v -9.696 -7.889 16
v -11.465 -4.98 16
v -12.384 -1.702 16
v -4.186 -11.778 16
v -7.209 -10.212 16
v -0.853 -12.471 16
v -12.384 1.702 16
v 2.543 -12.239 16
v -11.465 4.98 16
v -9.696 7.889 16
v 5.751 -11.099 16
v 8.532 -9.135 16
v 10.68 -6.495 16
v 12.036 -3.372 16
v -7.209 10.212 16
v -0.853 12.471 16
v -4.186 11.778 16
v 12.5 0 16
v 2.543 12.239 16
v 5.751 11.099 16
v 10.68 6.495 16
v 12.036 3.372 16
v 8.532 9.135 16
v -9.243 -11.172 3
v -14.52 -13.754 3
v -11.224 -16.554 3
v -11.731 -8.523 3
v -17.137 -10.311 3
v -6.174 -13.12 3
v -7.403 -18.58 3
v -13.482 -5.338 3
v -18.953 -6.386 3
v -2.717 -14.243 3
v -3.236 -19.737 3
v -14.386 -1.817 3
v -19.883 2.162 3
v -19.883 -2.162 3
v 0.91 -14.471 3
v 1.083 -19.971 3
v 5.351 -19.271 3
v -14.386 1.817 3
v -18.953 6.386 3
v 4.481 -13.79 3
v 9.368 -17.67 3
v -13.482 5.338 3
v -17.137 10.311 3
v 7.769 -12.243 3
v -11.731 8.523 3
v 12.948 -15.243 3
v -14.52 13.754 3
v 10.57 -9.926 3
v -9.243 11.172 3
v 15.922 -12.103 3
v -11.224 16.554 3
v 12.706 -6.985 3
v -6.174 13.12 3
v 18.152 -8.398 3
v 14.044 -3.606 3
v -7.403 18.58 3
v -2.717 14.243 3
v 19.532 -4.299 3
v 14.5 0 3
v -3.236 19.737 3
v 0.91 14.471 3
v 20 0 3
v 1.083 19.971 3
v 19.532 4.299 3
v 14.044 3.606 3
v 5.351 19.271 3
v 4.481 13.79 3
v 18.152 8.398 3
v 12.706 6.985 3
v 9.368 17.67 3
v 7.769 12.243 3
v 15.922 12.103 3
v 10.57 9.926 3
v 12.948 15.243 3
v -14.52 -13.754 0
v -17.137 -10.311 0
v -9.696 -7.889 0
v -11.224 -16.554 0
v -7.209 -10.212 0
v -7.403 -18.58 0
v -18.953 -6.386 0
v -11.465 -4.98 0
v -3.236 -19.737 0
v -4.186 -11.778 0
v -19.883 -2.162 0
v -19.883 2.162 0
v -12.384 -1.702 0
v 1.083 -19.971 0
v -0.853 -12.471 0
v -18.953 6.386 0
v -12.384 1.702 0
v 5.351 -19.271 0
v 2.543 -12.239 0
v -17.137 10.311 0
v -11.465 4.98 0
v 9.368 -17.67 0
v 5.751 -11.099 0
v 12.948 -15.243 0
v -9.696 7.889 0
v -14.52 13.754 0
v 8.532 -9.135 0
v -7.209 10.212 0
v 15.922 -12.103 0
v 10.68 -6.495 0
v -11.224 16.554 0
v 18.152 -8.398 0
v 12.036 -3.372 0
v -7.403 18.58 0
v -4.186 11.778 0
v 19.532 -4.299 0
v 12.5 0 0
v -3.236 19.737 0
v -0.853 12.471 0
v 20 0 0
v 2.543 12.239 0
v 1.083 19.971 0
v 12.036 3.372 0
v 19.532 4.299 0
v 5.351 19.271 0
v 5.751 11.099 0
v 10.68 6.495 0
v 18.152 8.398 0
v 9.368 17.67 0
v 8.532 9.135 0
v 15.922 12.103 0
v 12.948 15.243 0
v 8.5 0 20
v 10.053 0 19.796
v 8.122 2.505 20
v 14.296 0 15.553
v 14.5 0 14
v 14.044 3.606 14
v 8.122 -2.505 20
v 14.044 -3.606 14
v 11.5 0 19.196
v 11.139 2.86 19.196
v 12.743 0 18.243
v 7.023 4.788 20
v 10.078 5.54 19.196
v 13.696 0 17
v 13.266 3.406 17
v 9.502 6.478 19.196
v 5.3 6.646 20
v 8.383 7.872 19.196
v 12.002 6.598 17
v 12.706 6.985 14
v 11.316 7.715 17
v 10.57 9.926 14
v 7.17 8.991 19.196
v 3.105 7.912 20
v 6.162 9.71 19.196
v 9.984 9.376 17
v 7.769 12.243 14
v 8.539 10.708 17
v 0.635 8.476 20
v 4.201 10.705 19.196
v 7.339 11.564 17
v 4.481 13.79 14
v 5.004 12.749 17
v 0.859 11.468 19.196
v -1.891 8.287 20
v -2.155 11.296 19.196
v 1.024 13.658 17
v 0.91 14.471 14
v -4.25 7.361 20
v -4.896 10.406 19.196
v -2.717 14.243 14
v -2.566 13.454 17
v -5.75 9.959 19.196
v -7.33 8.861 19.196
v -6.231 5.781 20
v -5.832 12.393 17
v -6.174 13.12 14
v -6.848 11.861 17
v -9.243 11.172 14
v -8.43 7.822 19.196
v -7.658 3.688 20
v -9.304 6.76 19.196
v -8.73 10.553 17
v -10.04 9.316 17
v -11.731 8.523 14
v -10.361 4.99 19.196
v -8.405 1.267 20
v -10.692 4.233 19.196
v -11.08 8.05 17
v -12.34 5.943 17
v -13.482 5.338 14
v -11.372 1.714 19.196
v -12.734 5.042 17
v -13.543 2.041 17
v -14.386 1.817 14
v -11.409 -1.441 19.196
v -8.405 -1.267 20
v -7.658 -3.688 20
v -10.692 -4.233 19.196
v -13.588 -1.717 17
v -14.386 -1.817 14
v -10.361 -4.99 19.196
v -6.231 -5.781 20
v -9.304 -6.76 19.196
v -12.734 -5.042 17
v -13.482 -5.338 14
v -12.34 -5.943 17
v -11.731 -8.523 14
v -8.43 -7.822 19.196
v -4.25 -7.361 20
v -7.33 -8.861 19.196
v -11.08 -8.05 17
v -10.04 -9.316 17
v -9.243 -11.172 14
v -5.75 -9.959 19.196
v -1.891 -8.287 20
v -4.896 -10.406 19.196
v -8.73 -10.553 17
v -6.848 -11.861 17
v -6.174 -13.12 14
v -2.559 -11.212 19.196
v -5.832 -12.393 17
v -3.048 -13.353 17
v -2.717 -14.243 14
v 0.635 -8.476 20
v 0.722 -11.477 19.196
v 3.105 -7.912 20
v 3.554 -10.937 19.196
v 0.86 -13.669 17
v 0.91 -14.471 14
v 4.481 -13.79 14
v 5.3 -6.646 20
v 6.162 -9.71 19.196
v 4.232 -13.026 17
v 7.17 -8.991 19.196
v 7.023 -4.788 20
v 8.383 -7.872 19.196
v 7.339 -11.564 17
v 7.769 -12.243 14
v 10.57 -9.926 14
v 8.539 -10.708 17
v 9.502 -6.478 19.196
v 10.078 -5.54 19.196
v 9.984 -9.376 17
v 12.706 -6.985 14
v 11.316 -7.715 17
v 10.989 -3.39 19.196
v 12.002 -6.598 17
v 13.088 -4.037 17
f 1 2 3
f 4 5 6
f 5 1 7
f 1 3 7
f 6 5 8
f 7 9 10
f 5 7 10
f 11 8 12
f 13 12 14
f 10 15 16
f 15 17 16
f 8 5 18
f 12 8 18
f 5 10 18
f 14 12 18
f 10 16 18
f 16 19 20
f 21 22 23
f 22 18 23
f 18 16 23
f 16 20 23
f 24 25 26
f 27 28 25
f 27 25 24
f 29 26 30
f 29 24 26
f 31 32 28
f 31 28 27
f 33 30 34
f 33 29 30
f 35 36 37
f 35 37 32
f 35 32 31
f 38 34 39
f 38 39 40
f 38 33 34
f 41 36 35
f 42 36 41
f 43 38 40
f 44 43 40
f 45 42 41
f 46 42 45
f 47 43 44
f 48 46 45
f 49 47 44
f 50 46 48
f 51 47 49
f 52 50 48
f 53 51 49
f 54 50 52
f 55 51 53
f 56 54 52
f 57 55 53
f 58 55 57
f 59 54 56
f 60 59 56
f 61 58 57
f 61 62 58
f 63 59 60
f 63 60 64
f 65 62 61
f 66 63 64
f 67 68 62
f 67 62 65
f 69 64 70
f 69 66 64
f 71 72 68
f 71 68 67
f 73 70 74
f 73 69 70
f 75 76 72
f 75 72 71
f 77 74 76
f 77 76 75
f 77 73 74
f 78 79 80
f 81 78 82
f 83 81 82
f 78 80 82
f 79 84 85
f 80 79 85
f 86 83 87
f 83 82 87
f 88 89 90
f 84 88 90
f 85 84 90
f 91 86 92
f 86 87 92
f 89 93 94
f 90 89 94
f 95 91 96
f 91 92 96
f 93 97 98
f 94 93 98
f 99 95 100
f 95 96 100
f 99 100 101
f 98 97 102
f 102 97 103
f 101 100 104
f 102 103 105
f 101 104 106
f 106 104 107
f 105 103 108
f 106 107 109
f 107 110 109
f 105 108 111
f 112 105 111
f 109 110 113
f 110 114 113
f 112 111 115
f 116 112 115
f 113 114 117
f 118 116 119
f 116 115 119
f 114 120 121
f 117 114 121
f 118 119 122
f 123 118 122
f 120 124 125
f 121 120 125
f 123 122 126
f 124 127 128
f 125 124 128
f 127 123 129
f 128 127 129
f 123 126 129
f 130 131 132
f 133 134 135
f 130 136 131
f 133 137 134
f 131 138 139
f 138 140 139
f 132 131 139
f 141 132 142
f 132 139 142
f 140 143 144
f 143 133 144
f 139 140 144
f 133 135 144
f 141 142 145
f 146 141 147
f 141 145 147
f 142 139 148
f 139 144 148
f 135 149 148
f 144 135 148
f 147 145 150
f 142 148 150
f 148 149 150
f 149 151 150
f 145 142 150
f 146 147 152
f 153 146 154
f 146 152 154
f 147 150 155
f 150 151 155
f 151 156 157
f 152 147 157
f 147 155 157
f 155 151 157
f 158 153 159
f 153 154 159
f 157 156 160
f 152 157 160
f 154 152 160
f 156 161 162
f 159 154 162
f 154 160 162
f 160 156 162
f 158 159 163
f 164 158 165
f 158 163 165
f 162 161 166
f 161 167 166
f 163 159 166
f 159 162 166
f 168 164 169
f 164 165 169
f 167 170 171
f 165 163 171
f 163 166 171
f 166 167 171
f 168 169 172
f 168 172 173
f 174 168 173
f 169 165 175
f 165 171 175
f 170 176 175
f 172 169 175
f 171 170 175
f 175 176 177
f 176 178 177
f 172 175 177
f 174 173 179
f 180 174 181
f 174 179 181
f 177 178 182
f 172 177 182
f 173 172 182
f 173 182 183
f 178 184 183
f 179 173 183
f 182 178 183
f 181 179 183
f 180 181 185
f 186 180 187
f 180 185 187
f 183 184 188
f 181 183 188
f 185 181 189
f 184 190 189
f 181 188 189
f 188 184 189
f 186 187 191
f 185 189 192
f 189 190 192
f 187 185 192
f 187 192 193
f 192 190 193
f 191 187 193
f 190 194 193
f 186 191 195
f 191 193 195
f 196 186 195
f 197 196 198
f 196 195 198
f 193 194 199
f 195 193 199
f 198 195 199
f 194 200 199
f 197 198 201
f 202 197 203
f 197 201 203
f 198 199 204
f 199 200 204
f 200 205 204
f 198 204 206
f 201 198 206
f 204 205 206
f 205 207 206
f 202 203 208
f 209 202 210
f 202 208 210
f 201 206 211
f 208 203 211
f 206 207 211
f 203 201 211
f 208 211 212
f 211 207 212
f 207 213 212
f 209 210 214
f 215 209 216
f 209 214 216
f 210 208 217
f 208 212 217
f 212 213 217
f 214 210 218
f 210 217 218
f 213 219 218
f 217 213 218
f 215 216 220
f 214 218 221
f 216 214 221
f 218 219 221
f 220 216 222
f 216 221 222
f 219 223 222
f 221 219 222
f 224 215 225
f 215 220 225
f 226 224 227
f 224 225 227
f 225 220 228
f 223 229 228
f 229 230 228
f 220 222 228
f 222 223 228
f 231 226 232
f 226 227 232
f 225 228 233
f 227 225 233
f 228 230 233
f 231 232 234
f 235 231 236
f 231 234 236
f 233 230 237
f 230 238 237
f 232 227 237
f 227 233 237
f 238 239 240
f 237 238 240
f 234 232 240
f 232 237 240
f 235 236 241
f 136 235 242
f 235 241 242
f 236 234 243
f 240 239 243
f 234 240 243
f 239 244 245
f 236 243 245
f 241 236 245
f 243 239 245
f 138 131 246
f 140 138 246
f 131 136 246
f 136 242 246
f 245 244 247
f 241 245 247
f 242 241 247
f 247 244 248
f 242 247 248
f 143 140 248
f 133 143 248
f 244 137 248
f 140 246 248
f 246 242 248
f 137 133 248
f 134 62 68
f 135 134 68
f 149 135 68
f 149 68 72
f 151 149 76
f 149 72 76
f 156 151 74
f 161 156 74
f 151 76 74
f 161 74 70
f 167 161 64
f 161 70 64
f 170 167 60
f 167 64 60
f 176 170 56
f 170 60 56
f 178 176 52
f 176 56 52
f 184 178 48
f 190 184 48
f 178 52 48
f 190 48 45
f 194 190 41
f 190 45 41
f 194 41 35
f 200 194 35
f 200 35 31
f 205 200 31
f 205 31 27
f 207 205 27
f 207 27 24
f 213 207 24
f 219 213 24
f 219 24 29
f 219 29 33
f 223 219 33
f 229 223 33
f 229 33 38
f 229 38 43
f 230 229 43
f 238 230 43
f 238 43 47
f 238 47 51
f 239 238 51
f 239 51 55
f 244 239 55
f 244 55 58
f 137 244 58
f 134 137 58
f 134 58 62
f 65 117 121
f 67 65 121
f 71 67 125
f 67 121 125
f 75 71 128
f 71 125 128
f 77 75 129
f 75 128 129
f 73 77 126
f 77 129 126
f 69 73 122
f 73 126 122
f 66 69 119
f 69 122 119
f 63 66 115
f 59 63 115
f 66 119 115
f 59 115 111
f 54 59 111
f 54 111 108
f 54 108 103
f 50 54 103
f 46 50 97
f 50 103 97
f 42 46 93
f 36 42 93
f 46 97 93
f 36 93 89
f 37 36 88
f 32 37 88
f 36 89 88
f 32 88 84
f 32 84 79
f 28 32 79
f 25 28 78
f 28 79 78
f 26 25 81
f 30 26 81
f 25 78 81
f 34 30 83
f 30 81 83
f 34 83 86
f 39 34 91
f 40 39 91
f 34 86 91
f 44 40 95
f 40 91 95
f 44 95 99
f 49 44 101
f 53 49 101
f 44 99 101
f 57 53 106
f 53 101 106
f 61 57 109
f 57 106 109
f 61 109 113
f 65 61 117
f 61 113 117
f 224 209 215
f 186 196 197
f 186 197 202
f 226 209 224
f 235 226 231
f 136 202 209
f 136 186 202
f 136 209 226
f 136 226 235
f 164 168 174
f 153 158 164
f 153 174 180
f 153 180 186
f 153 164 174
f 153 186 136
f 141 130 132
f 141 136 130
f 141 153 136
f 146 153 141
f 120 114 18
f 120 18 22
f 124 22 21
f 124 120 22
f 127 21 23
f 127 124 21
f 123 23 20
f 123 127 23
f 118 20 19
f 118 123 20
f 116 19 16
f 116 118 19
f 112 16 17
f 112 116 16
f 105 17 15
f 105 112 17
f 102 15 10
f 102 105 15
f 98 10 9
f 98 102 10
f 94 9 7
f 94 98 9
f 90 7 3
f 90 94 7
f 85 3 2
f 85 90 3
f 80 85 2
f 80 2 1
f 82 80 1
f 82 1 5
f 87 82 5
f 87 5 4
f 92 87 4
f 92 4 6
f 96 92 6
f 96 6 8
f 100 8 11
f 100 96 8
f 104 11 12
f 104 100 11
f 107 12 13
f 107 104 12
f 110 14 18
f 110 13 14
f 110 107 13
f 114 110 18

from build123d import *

# Parameters (mm, degrees)
F0_R     = 20
F0_R_2   = 14.5
F1_DEPTH = 3
F0_R_3   = 12.5
F2_DEPTH = 20
F3_R     = 13.014075
F4_DEPTH = 4
F5_R     = 6


with BuildPart() as f1:
    # F0 (on Top) → F1 (new body)
    with BuildSketch(Plane.XY):
        Circle(F0_R)
        Circle(F0_R_2, mode=Mode.SUBTRACT)
    extrude(amount=F1_DEPTH)

    # F0 (on Top) → F2 (join)
    with BuildSketch(Plane.XY):
        Circle(F0_R_2)
        Circle(F0_R_3, mode=Mode.SUBTRACT)
    extrude(amount=F2_DEPTH)

    # F3 (on face) → F4 (join)
    with BuildSketch(Plane.XY.offset(20)):
        Circle(F3_R)
    extrude(amount=-F4_DEPTH)

    # F5
    f5_edges = [f1.edges().sort_by_distance(p)[0] for p in [
        (-14.5, 0, 20),
    ]]
    fillet(f5_edges, radius=F5_R)


solid = f1.part
